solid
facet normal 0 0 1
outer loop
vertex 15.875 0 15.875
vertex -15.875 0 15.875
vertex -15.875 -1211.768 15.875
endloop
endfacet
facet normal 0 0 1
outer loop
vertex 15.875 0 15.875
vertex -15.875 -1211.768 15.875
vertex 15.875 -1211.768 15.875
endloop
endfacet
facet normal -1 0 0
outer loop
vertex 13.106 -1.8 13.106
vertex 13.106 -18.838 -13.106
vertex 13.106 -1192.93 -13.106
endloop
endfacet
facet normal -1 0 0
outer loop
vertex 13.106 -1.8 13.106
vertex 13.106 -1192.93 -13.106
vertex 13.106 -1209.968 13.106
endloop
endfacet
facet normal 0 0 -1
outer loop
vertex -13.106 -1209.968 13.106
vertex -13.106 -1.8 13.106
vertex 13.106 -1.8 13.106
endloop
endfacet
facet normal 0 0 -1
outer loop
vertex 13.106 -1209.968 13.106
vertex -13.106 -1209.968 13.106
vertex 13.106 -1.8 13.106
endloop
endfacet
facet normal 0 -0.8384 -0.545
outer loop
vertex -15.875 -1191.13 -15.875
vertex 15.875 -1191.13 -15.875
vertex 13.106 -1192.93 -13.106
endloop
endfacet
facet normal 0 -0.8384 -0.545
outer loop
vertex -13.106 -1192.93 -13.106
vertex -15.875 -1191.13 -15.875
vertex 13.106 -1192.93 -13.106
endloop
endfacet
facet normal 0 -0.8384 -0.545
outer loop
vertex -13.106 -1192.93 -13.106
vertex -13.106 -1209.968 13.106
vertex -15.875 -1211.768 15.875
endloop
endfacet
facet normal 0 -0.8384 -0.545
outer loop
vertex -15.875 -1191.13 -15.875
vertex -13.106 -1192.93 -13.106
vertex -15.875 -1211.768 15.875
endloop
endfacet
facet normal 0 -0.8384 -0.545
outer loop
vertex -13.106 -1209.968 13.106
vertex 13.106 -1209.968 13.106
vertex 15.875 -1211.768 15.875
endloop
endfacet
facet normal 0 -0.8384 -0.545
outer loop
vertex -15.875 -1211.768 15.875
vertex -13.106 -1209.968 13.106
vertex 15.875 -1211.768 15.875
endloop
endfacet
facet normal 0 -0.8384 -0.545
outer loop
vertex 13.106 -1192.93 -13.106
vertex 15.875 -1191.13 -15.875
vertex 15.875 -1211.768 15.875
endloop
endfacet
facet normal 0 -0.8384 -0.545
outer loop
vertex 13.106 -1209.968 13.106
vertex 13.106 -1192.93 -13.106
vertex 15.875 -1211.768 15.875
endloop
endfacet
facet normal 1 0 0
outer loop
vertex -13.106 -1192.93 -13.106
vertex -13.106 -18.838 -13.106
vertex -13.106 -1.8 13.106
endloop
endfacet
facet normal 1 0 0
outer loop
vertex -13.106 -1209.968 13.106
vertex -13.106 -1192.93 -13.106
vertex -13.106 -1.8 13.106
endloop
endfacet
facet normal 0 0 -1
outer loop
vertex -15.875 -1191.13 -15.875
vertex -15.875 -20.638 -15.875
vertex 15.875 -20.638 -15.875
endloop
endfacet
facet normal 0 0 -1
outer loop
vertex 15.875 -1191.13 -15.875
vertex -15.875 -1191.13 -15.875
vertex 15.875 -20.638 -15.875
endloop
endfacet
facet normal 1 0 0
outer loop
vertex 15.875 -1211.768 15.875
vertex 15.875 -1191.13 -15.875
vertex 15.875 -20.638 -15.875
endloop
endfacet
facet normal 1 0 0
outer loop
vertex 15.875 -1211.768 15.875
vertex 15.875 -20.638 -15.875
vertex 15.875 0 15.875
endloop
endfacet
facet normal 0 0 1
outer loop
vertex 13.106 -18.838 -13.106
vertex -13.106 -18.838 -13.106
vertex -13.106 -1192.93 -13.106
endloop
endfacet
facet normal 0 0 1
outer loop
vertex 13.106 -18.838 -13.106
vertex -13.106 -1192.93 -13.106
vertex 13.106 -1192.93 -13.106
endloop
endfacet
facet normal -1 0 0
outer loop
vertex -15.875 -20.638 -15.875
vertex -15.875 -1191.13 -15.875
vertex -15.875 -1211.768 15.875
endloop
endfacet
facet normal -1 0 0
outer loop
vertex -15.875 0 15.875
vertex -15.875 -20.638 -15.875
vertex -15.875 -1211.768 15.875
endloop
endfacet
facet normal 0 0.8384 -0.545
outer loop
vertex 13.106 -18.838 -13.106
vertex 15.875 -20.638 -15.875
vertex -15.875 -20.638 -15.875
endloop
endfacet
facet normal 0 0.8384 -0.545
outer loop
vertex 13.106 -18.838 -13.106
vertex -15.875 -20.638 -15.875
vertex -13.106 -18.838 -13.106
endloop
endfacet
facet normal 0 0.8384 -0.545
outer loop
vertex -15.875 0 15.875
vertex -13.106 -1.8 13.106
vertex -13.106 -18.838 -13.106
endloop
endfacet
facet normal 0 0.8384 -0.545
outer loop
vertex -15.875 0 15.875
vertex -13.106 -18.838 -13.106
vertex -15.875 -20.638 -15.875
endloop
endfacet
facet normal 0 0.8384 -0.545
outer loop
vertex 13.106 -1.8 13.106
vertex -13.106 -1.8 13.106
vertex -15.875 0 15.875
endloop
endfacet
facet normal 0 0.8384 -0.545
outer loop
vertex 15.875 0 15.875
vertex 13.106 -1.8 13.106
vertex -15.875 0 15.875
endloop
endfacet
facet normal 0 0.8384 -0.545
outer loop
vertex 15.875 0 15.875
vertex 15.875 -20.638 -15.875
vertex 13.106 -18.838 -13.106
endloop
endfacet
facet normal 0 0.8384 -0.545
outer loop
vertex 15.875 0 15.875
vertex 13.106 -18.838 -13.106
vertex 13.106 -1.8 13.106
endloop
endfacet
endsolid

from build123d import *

# Parameters (mm, degrees)
SKETCH_W        = 31.75
SKETCH_H        = 31.75
SKETCH_W_2      = 26.2128
SKETCH_H_2      = 26.2128
PAD_DEPTH       = 1211.76796
POCKET_DEPTH    = 31.75
POCKET001_DEPTH = 31.75


with BuildPart() as part:
    # Sketch → Pad (new body)
    with BuildSketch(Plane.XZ):
        Rectangle(SKETCH_W, SKETCH_H)
        Rectangle(SKETCH_W_2, SKETCH_H_2, mode=Mode.SUBTRACT)
    extrude(amount=PAD_DEPTH)

    # Sketch001 → Pocket (cut)
    with BuildSketch(Plane(origin=(15.875, 0, 0), x_dir=(0, 0, 1), z_dir=(1, 0, 0))):
        Polygon((15.875, 0), (-15.875, 0), (-15.875, 20.637526), align=None)
    extrude(amount=-POCKET_DEPTH, mode=Mode.SUBTRACT)

    # Sketch002 → Pocket001 (cut)
    with BuildSketch(Plane(origin=(15.875, 0, 0), x_dir=(0, 0, 1), z_dir=(1, 0, 0))):
        Polygon((15.875, 1211.76796), (-15.875, 1211.76796), (-15.875, 1191.130434), align=None)
    extrude(amount=-POCKET001_DEPTH, mode=Mode.SUBTRACT)


solid = part.part
